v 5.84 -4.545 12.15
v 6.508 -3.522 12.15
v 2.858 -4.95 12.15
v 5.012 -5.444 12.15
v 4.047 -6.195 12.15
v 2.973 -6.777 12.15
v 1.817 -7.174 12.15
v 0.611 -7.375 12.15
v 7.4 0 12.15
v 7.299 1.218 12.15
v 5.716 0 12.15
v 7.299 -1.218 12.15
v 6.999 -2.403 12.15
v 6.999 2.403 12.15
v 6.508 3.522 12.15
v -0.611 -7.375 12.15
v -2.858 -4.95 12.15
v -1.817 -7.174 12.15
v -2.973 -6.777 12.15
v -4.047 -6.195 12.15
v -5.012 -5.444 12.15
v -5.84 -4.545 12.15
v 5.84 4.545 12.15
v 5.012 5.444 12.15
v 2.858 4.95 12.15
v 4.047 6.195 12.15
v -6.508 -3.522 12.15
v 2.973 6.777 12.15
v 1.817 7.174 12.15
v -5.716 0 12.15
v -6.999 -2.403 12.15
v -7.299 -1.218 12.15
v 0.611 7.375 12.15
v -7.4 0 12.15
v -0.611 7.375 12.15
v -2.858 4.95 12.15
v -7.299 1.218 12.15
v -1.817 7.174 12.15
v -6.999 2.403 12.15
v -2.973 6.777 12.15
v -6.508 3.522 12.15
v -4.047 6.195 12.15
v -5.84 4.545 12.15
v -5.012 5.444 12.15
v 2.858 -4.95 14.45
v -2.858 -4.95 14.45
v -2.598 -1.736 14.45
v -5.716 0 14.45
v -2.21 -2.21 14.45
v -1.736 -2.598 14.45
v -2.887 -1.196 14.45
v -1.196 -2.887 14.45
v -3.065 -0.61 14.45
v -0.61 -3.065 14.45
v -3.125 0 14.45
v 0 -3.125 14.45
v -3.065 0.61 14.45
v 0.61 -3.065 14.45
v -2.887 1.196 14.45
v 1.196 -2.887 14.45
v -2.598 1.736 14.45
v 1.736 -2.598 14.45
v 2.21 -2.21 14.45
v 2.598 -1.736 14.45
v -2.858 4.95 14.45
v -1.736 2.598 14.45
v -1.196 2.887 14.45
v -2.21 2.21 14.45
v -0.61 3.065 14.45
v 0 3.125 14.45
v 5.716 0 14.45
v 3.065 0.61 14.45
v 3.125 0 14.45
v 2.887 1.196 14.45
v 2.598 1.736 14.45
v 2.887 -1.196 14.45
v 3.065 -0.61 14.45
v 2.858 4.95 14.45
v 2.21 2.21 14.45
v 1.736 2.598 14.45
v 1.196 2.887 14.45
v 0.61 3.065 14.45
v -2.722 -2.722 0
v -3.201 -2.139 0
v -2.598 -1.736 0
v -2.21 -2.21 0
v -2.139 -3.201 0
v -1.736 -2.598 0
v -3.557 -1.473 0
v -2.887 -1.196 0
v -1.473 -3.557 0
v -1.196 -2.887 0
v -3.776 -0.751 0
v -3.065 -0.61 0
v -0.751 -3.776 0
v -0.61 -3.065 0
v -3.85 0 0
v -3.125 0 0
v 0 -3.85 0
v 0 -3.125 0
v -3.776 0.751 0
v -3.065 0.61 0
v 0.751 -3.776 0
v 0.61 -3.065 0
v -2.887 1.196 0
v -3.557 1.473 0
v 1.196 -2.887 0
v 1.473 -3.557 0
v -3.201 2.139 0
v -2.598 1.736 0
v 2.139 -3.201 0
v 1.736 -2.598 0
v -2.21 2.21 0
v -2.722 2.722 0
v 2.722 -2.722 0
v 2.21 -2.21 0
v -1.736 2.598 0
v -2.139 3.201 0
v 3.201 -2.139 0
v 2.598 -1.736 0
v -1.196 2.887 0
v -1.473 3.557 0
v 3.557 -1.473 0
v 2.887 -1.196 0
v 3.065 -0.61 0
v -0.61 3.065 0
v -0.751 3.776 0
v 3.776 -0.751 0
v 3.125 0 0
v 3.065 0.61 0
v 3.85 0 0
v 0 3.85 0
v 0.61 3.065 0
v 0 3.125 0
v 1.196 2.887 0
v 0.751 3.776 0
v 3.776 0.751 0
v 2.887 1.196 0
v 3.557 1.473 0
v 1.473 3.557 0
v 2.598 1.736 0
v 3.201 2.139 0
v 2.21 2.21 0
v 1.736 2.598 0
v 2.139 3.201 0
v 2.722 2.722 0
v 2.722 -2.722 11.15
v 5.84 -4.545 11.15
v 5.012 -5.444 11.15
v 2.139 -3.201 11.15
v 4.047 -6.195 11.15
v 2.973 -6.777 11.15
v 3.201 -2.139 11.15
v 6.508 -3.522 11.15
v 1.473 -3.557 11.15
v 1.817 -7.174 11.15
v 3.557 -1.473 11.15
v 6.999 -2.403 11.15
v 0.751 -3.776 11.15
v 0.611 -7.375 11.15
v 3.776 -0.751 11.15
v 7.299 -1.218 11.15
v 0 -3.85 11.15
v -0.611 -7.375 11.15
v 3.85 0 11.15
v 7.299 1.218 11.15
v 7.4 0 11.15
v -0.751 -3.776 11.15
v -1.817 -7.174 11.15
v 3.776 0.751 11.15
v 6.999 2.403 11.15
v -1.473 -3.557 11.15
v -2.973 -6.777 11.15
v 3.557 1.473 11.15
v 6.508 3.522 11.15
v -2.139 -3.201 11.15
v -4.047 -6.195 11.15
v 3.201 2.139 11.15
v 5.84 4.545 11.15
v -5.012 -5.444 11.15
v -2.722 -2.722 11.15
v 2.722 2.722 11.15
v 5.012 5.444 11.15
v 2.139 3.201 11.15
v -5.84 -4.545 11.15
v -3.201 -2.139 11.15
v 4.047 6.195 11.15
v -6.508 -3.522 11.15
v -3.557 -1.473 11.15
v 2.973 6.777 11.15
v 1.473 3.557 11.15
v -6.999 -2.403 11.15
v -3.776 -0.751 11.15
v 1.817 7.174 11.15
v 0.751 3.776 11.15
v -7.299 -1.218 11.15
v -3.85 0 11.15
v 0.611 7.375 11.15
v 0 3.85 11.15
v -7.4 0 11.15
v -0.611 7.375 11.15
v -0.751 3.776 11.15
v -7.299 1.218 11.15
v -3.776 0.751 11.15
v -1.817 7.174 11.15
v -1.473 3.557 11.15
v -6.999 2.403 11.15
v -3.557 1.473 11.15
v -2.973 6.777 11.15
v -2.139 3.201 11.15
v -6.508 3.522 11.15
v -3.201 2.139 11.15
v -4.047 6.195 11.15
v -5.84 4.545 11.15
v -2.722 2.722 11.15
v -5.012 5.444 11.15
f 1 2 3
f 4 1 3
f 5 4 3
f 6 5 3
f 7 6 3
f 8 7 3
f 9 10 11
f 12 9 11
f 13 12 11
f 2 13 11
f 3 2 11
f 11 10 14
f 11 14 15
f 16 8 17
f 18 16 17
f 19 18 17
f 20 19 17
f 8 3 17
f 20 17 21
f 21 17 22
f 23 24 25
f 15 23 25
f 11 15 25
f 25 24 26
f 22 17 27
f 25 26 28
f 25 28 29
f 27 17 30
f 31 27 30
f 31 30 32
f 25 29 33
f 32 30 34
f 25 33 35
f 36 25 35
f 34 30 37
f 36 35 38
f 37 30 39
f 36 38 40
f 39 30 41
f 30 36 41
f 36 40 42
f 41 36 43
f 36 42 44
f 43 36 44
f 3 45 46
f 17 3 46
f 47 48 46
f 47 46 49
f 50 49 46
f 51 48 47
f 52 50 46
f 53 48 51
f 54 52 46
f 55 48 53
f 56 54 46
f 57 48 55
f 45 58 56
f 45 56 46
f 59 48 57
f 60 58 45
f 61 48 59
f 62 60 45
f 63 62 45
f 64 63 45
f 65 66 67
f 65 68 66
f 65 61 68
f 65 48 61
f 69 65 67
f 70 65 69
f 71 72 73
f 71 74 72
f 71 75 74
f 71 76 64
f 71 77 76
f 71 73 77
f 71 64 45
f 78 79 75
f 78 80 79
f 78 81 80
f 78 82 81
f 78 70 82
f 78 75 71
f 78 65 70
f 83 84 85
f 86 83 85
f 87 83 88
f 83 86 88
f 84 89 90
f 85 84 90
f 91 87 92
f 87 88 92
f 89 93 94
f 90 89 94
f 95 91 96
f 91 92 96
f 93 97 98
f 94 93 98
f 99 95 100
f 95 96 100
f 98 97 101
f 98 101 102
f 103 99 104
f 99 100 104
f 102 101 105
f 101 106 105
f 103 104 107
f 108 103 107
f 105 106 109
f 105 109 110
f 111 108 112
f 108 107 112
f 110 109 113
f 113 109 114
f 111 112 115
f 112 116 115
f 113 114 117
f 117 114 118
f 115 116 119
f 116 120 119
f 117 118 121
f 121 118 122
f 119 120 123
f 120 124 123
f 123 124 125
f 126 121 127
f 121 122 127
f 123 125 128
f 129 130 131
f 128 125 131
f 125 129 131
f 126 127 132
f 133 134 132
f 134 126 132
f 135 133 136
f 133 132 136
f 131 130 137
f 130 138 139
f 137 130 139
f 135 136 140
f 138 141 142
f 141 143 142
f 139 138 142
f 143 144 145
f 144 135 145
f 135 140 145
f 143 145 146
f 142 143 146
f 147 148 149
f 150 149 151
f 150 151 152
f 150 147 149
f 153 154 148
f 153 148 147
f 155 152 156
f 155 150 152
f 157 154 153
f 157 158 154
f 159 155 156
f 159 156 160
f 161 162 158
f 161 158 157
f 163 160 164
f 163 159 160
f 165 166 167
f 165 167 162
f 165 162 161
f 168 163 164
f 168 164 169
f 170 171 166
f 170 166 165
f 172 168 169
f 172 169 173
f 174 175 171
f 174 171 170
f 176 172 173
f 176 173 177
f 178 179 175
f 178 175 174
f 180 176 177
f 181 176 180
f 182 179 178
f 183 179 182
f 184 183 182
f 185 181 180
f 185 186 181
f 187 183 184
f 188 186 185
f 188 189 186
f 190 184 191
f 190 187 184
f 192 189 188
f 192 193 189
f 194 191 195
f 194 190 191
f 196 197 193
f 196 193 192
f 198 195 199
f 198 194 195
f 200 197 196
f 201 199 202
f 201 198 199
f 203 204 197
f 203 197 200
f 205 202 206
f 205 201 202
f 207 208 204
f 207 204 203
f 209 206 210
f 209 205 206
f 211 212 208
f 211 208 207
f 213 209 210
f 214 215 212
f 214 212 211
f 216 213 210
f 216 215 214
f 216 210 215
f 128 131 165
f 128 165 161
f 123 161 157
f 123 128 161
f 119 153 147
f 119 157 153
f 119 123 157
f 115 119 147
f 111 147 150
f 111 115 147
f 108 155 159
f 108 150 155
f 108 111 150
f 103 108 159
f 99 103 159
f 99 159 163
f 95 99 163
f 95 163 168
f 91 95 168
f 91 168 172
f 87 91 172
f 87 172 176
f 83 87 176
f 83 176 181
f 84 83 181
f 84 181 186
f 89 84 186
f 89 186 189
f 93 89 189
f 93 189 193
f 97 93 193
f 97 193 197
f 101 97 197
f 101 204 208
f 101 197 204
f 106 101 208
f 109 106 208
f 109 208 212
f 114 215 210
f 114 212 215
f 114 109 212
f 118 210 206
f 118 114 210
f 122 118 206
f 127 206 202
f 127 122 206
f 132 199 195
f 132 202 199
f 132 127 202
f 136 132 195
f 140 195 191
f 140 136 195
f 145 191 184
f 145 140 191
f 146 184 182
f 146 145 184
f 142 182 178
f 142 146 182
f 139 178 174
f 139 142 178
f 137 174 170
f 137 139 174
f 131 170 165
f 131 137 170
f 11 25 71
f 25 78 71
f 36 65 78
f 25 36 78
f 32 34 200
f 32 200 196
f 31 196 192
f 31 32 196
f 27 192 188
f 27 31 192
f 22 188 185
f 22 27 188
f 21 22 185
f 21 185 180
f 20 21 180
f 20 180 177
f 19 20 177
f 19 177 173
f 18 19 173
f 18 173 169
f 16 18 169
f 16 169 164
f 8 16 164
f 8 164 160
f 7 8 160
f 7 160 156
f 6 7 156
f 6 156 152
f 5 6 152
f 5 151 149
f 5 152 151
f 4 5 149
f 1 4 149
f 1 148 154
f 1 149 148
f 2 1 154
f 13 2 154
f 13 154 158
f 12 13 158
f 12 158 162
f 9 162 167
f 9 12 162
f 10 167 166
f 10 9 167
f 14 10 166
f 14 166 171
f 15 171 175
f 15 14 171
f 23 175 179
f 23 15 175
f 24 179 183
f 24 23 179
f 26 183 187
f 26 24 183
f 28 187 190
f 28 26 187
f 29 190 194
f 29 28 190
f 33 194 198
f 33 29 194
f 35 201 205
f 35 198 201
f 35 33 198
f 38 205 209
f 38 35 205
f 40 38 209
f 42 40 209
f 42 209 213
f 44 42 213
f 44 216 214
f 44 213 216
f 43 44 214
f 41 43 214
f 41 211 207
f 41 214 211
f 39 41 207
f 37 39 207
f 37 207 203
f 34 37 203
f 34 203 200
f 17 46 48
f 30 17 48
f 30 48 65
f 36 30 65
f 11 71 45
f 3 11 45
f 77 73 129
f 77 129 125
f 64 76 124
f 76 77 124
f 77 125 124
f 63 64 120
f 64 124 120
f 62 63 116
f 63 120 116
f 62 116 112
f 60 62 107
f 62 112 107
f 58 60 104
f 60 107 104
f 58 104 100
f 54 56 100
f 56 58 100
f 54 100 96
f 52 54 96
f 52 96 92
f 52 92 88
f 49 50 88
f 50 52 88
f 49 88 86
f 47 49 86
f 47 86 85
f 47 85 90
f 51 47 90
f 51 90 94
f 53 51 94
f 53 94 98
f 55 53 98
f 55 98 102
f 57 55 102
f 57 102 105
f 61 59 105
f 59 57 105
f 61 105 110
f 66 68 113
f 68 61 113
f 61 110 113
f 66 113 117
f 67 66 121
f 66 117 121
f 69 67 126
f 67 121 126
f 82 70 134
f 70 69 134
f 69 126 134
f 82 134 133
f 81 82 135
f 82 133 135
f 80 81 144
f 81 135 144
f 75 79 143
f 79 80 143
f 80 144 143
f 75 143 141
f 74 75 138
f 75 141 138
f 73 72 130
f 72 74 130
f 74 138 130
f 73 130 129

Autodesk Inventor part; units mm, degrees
ref_plane "YZ Plane" through (0, 0, 0) normal (1, 0, 0) x (0, 1, 0)
ref_plane "XZ Plane" through (0, 0, 0) normal (0, 1, 0) x (-1, 0, 0)
ref_plane "XY Plane" through (0, 0, 0) normal (0, 0, 1) x (1, 0, 0)
sketch "Sketch1" plane through (0, 0, 0) normal (0, 0, 1) x (1, 0, 0)
  circle A0 centre (0, 0) radius 3.85
  circle A1 centre (0, 0) radius 3.125
  dimension "d0" = 7.7
  dimension "d2" = 6.25
extrude "Extrusion1" add sketch "Sketch1" along normal blind 14.45
sketch "Sketch2" plane through (0, 0, 14.45) normal (0, 0, 1) x (1, 0, 0)
  circle A0 centre (0, 0) radius 3.85 projected
  line L0 (-2.8579, 4.95) -> (2.8579, 4.95)
  line L1 (2.8579, 4.95) -> (5.7158, 0)
  line L2 (5.7158, 0) -> (2.8579, -4.95)
  line L3 (2.8579, -4.95) -> (-2.8579, -4.95)
  line L4 (-2.8579, -4.95) -> (-5.7158, 0)
  line L5 (-5.7158, 0) -> (-2.8579, 4.95)
  dimension "d5" = 9.9
extrude "Extrusion2" add sketch "Sketch2" against normal blind 2.3
sketch "Sketch3" plane through (0, 0, 12.15) normal (0, 0, -1) x (-1, 0, 0)
  circle A0 centre (0, 0) radius 3.85 projected
  circle A1 centre (0, 0) radius 7.4
  dimension "d8" = 14.8
extrude "Extrusion3" add sketch "Sketch3" along normal blind 1
thread "Thread1" size "M8x1.25" class "6g" standard "ANSI Metric M Profile" full length
properties part number "TUNING PEG RETAINER"
